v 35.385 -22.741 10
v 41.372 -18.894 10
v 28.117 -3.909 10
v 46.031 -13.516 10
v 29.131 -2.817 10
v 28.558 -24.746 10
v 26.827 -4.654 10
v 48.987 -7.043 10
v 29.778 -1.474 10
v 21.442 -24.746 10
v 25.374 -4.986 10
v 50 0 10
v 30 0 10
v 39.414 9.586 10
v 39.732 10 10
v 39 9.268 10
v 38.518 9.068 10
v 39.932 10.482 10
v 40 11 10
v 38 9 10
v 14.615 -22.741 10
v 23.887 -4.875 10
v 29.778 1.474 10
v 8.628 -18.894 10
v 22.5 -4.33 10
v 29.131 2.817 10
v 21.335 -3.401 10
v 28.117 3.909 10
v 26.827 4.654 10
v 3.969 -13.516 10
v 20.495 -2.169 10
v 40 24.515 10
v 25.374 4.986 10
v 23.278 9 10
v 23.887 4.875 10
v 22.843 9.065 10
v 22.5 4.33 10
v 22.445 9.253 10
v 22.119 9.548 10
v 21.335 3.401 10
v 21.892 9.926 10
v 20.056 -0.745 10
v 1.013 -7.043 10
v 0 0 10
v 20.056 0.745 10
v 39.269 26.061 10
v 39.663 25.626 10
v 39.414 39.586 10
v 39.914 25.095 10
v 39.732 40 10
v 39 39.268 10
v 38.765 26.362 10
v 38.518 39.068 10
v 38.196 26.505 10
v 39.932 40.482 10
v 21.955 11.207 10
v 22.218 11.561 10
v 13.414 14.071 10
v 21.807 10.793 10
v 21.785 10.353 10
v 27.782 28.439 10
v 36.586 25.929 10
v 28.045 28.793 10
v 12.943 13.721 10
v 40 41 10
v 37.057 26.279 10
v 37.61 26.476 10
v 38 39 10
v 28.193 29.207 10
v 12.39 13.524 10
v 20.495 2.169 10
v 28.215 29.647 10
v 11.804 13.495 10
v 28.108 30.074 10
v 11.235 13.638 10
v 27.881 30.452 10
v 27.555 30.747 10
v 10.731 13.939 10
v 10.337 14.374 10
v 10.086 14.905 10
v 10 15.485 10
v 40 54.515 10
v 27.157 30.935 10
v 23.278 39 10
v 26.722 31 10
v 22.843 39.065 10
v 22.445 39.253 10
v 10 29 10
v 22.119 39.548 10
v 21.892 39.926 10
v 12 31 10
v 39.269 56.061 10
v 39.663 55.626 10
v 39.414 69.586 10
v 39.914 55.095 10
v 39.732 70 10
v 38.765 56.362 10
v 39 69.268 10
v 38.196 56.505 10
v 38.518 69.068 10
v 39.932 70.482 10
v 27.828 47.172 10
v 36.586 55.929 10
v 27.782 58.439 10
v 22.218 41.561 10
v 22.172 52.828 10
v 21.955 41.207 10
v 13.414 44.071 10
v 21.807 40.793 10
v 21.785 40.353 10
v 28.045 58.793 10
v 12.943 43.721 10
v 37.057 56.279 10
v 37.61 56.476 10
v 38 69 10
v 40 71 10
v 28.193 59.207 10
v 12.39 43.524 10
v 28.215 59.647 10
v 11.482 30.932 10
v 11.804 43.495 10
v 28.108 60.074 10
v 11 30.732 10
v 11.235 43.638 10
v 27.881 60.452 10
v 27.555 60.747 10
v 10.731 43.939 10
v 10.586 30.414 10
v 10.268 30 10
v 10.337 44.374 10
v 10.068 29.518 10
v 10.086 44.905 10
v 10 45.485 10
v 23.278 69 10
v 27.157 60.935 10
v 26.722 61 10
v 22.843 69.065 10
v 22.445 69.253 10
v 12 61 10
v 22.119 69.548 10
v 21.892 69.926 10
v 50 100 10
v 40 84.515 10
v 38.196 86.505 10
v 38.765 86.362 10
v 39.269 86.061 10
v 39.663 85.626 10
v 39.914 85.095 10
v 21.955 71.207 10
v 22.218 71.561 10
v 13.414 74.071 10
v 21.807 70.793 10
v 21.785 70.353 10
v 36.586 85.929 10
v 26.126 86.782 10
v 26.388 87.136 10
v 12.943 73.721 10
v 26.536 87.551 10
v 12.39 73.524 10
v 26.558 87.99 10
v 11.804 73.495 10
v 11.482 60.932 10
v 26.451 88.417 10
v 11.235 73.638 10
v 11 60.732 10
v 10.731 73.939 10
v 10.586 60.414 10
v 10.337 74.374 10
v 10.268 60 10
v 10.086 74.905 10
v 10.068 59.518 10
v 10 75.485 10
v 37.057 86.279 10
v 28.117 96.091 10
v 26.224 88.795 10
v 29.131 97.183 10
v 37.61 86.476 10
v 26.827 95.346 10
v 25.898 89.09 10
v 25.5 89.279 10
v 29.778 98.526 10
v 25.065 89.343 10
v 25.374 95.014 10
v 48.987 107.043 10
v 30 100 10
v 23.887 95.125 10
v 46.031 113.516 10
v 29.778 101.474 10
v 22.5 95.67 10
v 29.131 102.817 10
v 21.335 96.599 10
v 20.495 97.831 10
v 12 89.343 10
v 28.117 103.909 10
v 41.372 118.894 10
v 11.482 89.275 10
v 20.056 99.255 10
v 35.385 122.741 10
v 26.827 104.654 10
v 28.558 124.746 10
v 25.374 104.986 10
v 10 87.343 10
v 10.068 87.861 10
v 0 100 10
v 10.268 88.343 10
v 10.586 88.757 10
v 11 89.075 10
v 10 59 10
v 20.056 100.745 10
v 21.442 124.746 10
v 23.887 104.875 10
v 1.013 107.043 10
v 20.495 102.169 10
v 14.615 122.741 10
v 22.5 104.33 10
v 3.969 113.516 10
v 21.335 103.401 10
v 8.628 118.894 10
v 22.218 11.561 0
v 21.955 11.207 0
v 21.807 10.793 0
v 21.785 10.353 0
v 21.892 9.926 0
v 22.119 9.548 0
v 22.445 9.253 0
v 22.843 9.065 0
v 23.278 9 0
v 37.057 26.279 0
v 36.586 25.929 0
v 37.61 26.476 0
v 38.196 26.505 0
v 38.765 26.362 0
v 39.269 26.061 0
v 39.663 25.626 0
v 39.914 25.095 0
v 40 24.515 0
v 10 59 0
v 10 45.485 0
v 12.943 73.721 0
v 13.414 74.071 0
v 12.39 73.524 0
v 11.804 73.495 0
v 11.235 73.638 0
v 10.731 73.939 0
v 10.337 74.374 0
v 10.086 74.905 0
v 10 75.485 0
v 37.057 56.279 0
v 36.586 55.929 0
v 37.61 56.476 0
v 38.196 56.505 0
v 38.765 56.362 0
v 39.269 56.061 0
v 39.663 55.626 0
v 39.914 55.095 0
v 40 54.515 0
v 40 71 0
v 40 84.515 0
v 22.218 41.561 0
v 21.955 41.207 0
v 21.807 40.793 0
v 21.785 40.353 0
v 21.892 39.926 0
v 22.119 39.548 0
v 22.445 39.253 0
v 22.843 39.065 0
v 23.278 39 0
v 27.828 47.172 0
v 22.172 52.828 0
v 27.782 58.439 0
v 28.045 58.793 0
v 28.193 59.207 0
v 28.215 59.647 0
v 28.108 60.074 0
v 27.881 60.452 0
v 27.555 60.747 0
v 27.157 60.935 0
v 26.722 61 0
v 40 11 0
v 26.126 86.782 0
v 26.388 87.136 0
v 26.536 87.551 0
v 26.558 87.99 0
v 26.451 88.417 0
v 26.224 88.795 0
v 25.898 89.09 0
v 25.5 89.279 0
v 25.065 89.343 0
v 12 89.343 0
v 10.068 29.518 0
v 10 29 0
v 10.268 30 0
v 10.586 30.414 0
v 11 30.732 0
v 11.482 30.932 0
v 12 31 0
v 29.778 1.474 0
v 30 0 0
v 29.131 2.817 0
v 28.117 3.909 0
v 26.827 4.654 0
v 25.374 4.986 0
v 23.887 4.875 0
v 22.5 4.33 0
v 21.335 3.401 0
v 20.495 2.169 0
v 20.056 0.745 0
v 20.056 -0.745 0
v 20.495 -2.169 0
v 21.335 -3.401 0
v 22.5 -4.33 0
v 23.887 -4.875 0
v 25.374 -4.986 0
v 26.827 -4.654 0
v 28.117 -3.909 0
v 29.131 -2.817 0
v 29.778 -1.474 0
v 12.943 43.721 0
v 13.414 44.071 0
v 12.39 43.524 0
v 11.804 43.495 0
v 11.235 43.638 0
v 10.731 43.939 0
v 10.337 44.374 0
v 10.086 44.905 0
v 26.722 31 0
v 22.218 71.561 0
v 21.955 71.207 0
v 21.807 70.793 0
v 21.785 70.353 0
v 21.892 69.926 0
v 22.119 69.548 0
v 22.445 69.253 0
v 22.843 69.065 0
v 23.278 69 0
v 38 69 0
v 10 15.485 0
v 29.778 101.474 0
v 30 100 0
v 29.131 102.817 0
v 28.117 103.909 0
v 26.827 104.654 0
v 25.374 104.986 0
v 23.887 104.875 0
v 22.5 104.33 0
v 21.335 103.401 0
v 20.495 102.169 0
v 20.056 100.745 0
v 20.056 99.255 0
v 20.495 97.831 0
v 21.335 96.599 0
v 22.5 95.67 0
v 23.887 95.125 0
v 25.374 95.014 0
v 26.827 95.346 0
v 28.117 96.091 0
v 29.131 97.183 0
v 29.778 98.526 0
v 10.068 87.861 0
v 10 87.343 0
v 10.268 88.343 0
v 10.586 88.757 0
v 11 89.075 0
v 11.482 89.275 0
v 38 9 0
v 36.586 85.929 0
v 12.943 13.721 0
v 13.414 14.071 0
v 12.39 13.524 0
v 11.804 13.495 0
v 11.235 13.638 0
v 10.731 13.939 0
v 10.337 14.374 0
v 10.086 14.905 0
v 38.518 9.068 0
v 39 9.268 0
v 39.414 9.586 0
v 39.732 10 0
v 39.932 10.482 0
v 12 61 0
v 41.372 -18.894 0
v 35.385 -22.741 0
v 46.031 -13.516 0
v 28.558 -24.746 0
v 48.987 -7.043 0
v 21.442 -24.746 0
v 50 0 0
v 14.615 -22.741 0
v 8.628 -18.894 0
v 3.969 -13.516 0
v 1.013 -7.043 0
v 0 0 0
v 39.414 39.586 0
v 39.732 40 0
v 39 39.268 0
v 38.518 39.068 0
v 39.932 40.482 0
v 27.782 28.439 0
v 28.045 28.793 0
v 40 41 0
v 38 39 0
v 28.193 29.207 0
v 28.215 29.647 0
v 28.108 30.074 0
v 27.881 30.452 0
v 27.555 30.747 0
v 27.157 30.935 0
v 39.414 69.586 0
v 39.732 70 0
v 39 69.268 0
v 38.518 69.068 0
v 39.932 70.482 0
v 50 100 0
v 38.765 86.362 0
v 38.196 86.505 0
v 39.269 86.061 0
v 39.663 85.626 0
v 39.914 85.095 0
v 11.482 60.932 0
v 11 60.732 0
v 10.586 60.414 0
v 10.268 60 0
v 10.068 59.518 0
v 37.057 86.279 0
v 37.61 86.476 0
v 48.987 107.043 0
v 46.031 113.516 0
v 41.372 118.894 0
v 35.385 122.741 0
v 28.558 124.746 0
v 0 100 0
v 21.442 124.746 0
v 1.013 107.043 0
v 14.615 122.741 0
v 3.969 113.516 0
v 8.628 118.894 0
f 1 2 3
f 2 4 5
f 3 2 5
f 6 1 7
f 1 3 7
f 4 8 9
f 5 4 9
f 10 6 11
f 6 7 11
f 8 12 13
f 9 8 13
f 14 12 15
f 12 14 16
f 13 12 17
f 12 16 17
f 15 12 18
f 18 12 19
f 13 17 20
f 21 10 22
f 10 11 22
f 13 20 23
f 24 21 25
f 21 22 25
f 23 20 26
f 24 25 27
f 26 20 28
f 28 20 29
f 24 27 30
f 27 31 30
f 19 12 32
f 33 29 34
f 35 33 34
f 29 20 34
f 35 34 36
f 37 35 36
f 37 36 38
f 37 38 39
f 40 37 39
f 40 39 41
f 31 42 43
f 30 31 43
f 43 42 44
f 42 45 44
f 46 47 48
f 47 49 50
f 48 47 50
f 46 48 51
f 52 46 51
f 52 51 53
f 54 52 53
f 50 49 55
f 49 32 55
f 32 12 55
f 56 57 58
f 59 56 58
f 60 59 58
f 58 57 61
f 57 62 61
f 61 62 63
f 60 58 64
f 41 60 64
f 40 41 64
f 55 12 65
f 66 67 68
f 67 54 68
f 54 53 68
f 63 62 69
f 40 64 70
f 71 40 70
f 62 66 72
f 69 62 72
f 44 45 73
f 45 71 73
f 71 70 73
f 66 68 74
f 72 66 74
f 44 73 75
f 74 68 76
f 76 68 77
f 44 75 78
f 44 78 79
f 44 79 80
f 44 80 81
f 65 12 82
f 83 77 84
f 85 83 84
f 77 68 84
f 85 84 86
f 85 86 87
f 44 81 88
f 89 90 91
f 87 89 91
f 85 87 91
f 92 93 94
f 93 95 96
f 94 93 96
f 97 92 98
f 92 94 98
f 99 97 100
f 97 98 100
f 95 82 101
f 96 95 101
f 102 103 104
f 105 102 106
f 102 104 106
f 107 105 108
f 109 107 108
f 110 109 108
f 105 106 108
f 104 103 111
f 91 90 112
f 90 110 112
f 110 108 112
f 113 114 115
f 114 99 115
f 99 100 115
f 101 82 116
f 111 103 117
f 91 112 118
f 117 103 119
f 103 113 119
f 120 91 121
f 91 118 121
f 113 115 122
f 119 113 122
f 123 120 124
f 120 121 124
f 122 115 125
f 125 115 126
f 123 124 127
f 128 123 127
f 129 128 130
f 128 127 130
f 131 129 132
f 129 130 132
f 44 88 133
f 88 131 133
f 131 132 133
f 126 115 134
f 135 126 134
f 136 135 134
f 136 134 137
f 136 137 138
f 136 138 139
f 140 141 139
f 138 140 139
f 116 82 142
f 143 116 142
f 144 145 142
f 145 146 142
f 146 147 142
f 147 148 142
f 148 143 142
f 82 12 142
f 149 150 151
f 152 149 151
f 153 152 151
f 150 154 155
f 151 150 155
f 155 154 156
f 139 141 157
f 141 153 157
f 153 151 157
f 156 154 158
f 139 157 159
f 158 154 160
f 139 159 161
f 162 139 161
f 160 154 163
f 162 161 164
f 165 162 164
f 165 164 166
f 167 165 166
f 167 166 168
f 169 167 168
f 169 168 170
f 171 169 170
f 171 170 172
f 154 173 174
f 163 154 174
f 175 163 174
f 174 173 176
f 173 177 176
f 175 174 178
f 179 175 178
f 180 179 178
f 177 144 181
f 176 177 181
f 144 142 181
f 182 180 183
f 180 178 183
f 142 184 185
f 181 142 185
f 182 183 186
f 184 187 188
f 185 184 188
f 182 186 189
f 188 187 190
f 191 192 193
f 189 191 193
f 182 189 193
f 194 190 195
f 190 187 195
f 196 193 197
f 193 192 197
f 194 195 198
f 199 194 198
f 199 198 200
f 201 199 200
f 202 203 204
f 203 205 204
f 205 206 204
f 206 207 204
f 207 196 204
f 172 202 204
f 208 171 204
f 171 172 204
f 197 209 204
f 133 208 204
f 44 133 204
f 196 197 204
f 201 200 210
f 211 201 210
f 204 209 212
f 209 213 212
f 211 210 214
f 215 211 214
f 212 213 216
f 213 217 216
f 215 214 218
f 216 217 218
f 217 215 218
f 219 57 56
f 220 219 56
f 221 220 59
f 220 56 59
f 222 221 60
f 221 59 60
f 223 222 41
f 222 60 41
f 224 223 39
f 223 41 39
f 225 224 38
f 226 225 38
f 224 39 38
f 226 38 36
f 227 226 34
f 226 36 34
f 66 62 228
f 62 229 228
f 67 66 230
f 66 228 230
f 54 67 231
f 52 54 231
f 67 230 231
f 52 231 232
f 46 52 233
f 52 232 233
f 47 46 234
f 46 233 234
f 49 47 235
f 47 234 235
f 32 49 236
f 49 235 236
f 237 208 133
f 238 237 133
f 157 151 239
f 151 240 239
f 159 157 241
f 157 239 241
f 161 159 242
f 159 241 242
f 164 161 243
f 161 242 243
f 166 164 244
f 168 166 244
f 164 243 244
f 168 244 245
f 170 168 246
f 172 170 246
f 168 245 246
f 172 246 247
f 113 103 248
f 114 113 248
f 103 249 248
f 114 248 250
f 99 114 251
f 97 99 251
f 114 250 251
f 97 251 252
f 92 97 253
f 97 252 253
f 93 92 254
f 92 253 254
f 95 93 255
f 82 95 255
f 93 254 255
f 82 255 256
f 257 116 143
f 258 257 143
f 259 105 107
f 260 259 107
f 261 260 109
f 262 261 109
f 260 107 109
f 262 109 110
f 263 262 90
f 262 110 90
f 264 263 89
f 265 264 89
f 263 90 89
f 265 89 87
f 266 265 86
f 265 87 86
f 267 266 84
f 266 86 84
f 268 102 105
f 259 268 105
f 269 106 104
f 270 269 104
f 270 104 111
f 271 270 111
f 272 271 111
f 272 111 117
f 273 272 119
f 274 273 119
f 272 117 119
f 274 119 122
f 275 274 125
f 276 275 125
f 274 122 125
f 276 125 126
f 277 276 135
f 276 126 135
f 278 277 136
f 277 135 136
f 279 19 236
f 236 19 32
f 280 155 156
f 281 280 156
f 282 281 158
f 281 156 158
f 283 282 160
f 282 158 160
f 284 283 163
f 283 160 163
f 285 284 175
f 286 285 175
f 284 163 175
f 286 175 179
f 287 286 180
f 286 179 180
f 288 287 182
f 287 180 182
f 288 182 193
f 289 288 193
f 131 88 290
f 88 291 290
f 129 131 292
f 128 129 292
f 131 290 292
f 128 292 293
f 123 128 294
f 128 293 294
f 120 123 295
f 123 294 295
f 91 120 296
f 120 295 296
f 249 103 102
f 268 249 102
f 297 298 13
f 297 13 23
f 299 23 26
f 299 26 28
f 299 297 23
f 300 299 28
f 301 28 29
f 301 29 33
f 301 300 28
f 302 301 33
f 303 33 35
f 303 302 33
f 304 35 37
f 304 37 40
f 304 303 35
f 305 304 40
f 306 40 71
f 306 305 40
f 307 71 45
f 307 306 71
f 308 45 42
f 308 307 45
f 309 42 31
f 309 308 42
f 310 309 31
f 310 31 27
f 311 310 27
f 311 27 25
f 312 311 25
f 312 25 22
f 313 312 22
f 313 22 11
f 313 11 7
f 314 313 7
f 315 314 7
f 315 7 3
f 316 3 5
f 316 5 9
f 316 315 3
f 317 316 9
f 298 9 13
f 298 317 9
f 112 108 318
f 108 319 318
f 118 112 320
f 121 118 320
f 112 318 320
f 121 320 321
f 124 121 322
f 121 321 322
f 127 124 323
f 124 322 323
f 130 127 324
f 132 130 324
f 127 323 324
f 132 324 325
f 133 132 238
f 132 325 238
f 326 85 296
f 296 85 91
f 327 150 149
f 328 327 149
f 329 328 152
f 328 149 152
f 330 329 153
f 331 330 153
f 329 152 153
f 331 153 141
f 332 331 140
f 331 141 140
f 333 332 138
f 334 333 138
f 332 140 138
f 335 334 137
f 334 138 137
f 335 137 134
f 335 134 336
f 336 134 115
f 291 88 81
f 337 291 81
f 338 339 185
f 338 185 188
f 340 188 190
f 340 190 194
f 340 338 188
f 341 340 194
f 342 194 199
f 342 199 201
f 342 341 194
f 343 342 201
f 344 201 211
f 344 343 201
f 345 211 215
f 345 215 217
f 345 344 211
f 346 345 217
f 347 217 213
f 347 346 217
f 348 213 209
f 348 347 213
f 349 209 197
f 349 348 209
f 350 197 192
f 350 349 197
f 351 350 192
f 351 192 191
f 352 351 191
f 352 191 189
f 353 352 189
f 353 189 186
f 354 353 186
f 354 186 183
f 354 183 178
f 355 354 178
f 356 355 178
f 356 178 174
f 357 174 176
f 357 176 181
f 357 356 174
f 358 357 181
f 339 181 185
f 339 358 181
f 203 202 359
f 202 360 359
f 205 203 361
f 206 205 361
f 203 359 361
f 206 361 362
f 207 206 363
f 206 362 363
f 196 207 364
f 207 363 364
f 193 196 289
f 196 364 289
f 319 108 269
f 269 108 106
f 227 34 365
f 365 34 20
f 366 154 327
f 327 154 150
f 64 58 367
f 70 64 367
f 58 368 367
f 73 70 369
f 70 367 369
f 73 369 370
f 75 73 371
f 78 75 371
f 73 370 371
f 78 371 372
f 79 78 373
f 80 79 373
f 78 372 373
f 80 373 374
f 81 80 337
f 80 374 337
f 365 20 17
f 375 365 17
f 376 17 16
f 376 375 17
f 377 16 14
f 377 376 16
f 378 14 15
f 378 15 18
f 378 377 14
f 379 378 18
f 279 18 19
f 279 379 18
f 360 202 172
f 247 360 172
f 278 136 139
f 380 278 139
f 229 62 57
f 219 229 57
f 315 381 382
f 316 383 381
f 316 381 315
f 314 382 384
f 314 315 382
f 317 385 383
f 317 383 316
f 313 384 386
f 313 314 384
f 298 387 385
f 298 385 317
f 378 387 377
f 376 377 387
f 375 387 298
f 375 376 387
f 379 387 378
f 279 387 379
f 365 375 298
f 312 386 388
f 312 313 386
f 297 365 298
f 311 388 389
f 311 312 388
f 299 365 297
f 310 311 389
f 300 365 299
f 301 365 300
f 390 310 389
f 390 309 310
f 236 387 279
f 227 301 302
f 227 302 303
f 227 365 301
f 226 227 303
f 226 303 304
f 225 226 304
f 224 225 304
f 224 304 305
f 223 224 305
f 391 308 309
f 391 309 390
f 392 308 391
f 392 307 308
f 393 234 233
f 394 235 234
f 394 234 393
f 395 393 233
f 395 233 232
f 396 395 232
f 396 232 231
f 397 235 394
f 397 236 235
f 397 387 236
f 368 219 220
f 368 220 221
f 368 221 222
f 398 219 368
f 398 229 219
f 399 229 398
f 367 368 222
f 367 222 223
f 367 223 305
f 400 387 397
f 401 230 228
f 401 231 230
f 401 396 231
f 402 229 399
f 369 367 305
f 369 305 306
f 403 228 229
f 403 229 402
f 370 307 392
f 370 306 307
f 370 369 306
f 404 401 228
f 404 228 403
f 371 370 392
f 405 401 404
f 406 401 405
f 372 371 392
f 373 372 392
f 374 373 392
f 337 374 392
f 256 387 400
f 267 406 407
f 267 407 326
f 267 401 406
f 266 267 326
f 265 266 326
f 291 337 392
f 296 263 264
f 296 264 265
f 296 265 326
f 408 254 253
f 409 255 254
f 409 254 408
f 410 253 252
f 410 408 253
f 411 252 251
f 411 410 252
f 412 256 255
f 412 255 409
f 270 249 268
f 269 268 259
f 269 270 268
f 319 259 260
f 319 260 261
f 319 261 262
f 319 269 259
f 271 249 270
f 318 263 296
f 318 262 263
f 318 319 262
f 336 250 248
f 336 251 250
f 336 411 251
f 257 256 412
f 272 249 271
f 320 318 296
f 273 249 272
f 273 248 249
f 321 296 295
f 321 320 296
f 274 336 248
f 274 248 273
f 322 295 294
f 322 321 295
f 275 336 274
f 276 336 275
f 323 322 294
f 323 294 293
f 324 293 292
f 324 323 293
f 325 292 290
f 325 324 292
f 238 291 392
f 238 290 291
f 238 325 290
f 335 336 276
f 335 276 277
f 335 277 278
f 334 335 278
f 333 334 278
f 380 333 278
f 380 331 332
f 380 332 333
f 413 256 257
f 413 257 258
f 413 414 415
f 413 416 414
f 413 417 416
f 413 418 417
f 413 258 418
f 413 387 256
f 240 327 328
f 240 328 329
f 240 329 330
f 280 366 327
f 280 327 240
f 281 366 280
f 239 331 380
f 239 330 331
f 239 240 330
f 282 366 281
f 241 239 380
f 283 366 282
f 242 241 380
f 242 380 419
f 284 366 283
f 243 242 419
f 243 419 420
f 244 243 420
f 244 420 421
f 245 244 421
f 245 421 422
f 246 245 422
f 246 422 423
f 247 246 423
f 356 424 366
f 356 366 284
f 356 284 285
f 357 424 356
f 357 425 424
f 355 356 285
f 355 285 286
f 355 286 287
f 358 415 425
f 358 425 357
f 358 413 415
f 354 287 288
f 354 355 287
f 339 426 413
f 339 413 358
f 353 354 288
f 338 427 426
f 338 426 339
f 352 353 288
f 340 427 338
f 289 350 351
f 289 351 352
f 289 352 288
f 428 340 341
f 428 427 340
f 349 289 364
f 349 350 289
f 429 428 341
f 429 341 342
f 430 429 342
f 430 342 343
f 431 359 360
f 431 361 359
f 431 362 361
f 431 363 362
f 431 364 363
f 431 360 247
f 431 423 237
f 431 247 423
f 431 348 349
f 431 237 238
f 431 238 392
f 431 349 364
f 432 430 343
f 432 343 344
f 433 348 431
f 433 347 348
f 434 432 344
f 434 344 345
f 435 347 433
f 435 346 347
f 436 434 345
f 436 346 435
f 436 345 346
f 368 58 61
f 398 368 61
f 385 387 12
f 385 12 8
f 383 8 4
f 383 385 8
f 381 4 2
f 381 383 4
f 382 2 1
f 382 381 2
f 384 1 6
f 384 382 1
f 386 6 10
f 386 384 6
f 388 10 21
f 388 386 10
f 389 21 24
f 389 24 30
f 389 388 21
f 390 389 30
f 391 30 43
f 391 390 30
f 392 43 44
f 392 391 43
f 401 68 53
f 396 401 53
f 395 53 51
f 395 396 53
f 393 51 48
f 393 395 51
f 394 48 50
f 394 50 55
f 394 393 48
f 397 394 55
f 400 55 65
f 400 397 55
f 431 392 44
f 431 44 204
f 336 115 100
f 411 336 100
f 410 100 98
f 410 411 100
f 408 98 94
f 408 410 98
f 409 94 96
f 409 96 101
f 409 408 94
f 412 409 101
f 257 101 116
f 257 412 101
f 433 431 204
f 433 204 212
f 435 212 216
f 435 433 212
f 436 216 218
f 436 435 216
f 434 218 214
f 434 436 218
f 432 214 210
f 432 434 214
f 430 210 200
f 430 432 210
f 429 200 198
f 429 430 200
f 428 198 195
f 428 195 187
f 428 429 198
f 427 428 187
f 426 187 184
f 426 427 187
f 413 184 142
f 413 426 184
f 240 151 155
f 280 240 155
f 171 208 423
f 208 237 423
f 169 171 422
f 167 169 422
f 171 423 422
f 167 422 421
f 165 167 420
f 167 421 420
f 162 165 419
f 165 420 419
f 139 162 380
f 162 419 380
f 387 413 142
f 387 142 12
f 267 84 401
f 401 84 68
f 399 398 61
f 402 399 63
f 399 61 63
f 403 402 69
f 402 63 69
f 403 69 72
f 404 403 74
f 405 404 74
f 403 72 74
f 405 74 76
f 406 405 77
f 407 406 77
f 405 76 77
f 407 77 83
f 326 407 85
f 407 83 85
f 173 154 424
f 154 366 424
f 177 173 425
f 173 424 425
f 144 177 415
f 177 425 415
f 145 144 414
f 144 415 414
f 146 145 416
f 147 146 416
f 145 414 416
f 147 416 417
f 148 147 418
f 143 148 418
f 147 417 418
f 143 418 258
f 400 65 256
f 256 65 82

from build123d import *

# Parameters (mm, degrees)
SKETCH1_R           = 5
BOSS_EXTRUDE1_DEPTH = 10
CUT_EXTRUDE2_DEPTH  = 10
FILLET1_R           = 2


with BuildPart() as part:
    # Sketch1 → Boss-Extrude1 (new body)
    # profile 1 of 2: a face of its own
    with BuildSketch(Plane.XY):
        with BuildLine():
            Line((0, 0), (0, 100))
            ThreePointArc((0, 100), (25, 125), (50, 100))
            Line((50, 100), (50, 0))
            ThreePointArc((50, 0), (25, -25), (0, 0))
        make_face()
        with BuildLine():
            ThreePointArc((15, 0), (25, -10), (35, 0))
            Line((35, 0), (35, 100))
            ThreePointArc((35, 100), (25, 110), (15, 100))
            Line((15, 100), (15, 0))
        make_face(mode=Mode.SUBTRACT)
    # profile 2 of 2: a face of its own
    with BuildSketch(Plane.XY):
        with BuildLine():
            Line((15, 0), (15, 100))
            ThreePointArc((15, 100), (25, 110), (35, 100))
            Line((35, 100), (35, 0))
            ThreePointArc((35, 0), (25, -10), (15, 0))
        make_face()
        with Locations((25, 0)):
            Circle(SKETCH1_R, mode=Mode.SUBTRACT)
        with Locations((25, 100)):
            Circle(SKETCH1_R, mode=Mode.SUBTRACT)
    extrude(amount=BOSS_EXTRUDE1_DEPTH)

    # Sketch2 → Cut-Extrude2 (cut)
    with BuildSketch(Plane.XY.offset(10)):
        with BuildLine():
            Line((25.064971157, 89.343145751), (10, 89.343145751))
            Line((10, 89.343145751), (10, 70.656854249))
            Line((10, 70.656854249), (26.125631329, 86.782485579))
            ThreePointArc((26.125631329, 86.782485579), (26.450790456, 88.417170899), (25.064971157, 89.343145751))
        make_face()
        with BuildLine():
            Line((40, 69), (40, 89.343145751))
            Line((40, 89.343145751), (22.217514421, 71.560660172))
            ThreePointArc((22.217514421, 71.560660172), (21.892355294, 69.925974851), (23.278174593, 69))
            Line((23.278174593, 69), (40, 69))
        make_face()
        with BuildLine():
            Line((26.721825407, 61), (10, 61))
            Line((10, 61), (10, 40.65685425))
            Line((10, 40.65685425), (22.171572875, 52.828427125))
            Line((22.171572875, 52.828427125), (27.782485579, 58.439339828))
            ThreePointArc((27.782485579, 58.439339828), (28.107644706, 60.074025149), (26.721825407, 61))
        make_face()
        with BuildLine():
            Line((40, 39), (40, 59.343145751))
            Line((40, 59.343145751), (27.828427125, 47.171572875))
            Line((27.828427125, 47.171572875), (22.217514421, 41.560660172))
            ThreePointArc((22.217514421, 41.560660172), (21.892355294, 39.925974852), (23.278174593, 39))
            Line((23.278174593, 39), (40, 39))
        make_face()
        with BuildLine():
            Line((26.721825408, 31.000000001), (10, 31.000000001))
            Line((10, 31.000000001), (10, 10.656854249))
            Line((10, 10.656854249), (27.782485579, 28.439339829))
            ThreePointArc((27.782485579, 28.439339829), (28.107644706, 30.074025149), (26.721825408, 31.000000001))
        make_face()
        with BuildLine():
            Line((40, 9), (40, 29.34314575))
            Line((40, 29.34314575), (22.217514422, 11.560660171))
            ThreePointArc((22.217514422, 11.560660171), (21.892355295, 9.925974851), (23.278174594, 9))
            Line((23.278174594, 9), (40, 9))
        make_face()
    extrude(amount=-CUT_EXTRUDE2_DEPTH, mode=Mode.SUBTRACT)

    # Fillet1
    fillet1_edges = [part.edges().sort_by_distance(p)[0] for p in [
        (10, 10.656854249, 5),
        (10, 31.000000001, 5),
        (40, 59.343145751, 5),
        (40, 39, 5),
        (10, 40.65685425, 5),
        (10, 61, 5),
        (40, 89.343145751, 5),
        (40, 69, 5),
        (40, 29.34314575, 5),
        (40, 9, 5),
        (10, 70.656854249, 5),
        (10, 89.343145751, 5),
    ]]
    fillet(fillet1_edges, radius=FILLET1_R)


solid = part.part
